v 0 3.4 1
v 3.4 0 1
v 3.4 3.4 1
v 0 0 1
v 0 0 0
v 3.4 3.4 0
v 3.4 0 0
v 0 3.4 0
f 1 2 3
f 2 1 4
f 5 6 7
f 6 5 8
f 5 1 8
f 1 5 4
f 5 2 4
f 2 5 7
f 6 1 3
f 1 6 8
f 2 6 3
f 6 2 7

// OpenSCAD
// 3D grid of cubes that overlap each neighbour
stride=0.8;

intersection() {
  union() {
    for (i=[0:3],j=[0:3])
      translate([i*stride, j*stride, 0])
        cube(1);
  }
  cube(10, center=1); // Just to ensure fast-union doesn't drop the union above we're trying to test
}
